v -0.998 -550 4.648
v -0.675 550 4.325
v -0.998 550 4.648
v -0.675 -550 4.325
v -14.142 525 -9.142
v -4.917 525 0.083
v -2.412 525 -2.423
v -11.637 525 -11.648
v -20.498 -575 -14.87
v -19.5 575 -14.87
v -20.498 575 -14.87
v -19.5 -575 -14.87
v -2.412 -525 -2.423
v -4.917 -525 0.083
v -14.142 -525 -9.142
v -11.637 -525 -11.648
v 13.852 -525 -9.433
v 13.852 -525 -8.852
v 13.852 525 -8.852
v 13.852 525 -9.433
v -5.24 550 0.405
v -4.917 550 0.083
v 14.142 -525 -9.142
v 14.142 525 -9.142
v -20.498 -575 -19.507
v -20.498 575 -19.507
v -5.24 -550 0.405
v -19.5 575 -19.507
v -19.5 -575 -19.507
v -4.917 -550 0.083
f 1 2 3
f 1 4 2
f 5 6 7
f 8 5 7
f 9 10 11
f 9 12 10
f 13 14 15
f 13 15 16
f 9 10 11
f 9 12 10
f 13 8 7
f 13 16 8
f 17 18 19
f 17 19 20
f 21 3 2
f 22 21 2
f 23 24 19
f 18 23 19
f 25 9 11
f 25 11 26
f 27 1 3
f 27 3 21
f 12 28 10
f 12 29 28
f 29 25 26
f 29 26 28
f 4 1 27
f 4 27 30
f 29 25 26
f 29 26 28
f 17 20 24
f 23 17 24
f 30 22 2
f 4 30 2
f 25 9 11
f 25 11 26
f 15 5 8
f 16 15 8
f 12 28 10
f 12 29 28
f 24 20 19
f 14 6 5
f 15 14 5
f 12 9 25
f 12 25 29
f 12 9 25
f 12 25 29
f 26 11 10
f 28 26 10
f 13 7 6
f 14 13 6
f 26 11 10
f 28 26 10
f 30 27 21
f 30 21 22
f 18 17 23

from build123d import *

# Parameters (mm, degrees)
F1_DEPTH = 525
F2_DEPTH = 550
F3_DEPTH = 575
F5_DEPTH = 550
F6_DEPTH = 575


with BuildPart() as f1:
    # F0 (on Front) → F1 (new body, symmetric)
    with BuildSketch(Plane.XZ):
        Polygon((-2.4118969857, -2.4231005272), (-4.9174987565, 0.0825012435), (-14.1421356237, -9.1421356237), (-11.636533853, -11.6477373945), align=None)
    extrude(amount=F1_DEPTH, both=True)


with BuildPart() as f1b:
    # F0 (on Front) → F1, piece 2 (new body, symmetric)
    with BuildSketch(Plane.XZ):
        Polygon((14.1421356237, -9.1421356237), (13.8515589816, -8.8515589816), (13.8515589816, -9.4327122659), align=None)
    extrude(amount=F1_DEPTH, both=True)


with BuildPart() as f2:
    # F0 (on Front) → F2 (new body, symmetric)
    with BuildSketch(Plane.XZ):
        Polygon((-0.6748580693, 4.3251419307), (0, 5), (4.2426406871, 0.7573593129), (13.8193102697, -8.8193102697), (13.8515589816, -8.7870615579), (10.8745088347, -5.810011411), (10.854404961, -5.7899075373), (5.416530139, -0.3520327153), (0.416530139, 4.6479672847), (-0.6748580693, 5.739355493), (-1.4142135624, 5), (-6.4142135624, 0), (-11.872192258, -5.4579786956), (-14.8492424049, -8.4350288425), (-14.4649609777, -8.8193102697), (-5.2403241105, 0.4053265976), (-0.9976834234, 4.6479672847), align=None)
        Polygon((-4.2426406871, 0.7573593129), (-0.6748580693, 4.3251419307), (-0.9976834234, 4.6479672847), (-5.2403241105, 0.4053265976), (-4.9174987565, 0.0825012435), align=None)
    extrude(amount=F2_DEPTH, both=True)


with BuildPart() as f3:
    # F0 (on Front) → F3 (new body, symmetric)
    with BuildSketch(Plane.XZ):
        Polygon((-19.5, -17.5), (-19.5, -14.8695067036), (-20.4976834234, -14.8695067036), (-20.4976834234, -17.8520327153), (-20.4976834234, -19.5070338249), (-19.5, -19.5070338249), align=None)
    extrude(amount=F3_DEPTH, both=True)


with BuildPart() as f5:
    # F0 (on Front) → F5 (new body, symmetric)
    with BuildSketch(Plane.XZ):
        Polygon((-4.2426406871, 0.7573593129), (-0.6748580693, 4.3251419307), (-0.9976834234, 4.6479672847), (-5.2403241105, 0.4053265976), (-4.9174987565, 0.0825012435), align=None)
    extrude(amount=F5_DEPTH, both=True)


with BuildPart() as f6:
    # F0 (on Front) → F6 (new body, symmetric)
    with BuildSketch(Plane.XZ):
        Polygon((-19.5, -17.5), (-19.5, -14.8695067036), (-20.4976834234, -14.8695067036), (-20.4976834234, -17.8520327153), (-20.4976834234, -19.5070338249), (-19.5, -19.5070338249), align=None)
    extrude(amount=F6_DEPTH, both=True)


solid = Compound([f1.part, f1b.part, f3.part, f5.part, f6.part])
